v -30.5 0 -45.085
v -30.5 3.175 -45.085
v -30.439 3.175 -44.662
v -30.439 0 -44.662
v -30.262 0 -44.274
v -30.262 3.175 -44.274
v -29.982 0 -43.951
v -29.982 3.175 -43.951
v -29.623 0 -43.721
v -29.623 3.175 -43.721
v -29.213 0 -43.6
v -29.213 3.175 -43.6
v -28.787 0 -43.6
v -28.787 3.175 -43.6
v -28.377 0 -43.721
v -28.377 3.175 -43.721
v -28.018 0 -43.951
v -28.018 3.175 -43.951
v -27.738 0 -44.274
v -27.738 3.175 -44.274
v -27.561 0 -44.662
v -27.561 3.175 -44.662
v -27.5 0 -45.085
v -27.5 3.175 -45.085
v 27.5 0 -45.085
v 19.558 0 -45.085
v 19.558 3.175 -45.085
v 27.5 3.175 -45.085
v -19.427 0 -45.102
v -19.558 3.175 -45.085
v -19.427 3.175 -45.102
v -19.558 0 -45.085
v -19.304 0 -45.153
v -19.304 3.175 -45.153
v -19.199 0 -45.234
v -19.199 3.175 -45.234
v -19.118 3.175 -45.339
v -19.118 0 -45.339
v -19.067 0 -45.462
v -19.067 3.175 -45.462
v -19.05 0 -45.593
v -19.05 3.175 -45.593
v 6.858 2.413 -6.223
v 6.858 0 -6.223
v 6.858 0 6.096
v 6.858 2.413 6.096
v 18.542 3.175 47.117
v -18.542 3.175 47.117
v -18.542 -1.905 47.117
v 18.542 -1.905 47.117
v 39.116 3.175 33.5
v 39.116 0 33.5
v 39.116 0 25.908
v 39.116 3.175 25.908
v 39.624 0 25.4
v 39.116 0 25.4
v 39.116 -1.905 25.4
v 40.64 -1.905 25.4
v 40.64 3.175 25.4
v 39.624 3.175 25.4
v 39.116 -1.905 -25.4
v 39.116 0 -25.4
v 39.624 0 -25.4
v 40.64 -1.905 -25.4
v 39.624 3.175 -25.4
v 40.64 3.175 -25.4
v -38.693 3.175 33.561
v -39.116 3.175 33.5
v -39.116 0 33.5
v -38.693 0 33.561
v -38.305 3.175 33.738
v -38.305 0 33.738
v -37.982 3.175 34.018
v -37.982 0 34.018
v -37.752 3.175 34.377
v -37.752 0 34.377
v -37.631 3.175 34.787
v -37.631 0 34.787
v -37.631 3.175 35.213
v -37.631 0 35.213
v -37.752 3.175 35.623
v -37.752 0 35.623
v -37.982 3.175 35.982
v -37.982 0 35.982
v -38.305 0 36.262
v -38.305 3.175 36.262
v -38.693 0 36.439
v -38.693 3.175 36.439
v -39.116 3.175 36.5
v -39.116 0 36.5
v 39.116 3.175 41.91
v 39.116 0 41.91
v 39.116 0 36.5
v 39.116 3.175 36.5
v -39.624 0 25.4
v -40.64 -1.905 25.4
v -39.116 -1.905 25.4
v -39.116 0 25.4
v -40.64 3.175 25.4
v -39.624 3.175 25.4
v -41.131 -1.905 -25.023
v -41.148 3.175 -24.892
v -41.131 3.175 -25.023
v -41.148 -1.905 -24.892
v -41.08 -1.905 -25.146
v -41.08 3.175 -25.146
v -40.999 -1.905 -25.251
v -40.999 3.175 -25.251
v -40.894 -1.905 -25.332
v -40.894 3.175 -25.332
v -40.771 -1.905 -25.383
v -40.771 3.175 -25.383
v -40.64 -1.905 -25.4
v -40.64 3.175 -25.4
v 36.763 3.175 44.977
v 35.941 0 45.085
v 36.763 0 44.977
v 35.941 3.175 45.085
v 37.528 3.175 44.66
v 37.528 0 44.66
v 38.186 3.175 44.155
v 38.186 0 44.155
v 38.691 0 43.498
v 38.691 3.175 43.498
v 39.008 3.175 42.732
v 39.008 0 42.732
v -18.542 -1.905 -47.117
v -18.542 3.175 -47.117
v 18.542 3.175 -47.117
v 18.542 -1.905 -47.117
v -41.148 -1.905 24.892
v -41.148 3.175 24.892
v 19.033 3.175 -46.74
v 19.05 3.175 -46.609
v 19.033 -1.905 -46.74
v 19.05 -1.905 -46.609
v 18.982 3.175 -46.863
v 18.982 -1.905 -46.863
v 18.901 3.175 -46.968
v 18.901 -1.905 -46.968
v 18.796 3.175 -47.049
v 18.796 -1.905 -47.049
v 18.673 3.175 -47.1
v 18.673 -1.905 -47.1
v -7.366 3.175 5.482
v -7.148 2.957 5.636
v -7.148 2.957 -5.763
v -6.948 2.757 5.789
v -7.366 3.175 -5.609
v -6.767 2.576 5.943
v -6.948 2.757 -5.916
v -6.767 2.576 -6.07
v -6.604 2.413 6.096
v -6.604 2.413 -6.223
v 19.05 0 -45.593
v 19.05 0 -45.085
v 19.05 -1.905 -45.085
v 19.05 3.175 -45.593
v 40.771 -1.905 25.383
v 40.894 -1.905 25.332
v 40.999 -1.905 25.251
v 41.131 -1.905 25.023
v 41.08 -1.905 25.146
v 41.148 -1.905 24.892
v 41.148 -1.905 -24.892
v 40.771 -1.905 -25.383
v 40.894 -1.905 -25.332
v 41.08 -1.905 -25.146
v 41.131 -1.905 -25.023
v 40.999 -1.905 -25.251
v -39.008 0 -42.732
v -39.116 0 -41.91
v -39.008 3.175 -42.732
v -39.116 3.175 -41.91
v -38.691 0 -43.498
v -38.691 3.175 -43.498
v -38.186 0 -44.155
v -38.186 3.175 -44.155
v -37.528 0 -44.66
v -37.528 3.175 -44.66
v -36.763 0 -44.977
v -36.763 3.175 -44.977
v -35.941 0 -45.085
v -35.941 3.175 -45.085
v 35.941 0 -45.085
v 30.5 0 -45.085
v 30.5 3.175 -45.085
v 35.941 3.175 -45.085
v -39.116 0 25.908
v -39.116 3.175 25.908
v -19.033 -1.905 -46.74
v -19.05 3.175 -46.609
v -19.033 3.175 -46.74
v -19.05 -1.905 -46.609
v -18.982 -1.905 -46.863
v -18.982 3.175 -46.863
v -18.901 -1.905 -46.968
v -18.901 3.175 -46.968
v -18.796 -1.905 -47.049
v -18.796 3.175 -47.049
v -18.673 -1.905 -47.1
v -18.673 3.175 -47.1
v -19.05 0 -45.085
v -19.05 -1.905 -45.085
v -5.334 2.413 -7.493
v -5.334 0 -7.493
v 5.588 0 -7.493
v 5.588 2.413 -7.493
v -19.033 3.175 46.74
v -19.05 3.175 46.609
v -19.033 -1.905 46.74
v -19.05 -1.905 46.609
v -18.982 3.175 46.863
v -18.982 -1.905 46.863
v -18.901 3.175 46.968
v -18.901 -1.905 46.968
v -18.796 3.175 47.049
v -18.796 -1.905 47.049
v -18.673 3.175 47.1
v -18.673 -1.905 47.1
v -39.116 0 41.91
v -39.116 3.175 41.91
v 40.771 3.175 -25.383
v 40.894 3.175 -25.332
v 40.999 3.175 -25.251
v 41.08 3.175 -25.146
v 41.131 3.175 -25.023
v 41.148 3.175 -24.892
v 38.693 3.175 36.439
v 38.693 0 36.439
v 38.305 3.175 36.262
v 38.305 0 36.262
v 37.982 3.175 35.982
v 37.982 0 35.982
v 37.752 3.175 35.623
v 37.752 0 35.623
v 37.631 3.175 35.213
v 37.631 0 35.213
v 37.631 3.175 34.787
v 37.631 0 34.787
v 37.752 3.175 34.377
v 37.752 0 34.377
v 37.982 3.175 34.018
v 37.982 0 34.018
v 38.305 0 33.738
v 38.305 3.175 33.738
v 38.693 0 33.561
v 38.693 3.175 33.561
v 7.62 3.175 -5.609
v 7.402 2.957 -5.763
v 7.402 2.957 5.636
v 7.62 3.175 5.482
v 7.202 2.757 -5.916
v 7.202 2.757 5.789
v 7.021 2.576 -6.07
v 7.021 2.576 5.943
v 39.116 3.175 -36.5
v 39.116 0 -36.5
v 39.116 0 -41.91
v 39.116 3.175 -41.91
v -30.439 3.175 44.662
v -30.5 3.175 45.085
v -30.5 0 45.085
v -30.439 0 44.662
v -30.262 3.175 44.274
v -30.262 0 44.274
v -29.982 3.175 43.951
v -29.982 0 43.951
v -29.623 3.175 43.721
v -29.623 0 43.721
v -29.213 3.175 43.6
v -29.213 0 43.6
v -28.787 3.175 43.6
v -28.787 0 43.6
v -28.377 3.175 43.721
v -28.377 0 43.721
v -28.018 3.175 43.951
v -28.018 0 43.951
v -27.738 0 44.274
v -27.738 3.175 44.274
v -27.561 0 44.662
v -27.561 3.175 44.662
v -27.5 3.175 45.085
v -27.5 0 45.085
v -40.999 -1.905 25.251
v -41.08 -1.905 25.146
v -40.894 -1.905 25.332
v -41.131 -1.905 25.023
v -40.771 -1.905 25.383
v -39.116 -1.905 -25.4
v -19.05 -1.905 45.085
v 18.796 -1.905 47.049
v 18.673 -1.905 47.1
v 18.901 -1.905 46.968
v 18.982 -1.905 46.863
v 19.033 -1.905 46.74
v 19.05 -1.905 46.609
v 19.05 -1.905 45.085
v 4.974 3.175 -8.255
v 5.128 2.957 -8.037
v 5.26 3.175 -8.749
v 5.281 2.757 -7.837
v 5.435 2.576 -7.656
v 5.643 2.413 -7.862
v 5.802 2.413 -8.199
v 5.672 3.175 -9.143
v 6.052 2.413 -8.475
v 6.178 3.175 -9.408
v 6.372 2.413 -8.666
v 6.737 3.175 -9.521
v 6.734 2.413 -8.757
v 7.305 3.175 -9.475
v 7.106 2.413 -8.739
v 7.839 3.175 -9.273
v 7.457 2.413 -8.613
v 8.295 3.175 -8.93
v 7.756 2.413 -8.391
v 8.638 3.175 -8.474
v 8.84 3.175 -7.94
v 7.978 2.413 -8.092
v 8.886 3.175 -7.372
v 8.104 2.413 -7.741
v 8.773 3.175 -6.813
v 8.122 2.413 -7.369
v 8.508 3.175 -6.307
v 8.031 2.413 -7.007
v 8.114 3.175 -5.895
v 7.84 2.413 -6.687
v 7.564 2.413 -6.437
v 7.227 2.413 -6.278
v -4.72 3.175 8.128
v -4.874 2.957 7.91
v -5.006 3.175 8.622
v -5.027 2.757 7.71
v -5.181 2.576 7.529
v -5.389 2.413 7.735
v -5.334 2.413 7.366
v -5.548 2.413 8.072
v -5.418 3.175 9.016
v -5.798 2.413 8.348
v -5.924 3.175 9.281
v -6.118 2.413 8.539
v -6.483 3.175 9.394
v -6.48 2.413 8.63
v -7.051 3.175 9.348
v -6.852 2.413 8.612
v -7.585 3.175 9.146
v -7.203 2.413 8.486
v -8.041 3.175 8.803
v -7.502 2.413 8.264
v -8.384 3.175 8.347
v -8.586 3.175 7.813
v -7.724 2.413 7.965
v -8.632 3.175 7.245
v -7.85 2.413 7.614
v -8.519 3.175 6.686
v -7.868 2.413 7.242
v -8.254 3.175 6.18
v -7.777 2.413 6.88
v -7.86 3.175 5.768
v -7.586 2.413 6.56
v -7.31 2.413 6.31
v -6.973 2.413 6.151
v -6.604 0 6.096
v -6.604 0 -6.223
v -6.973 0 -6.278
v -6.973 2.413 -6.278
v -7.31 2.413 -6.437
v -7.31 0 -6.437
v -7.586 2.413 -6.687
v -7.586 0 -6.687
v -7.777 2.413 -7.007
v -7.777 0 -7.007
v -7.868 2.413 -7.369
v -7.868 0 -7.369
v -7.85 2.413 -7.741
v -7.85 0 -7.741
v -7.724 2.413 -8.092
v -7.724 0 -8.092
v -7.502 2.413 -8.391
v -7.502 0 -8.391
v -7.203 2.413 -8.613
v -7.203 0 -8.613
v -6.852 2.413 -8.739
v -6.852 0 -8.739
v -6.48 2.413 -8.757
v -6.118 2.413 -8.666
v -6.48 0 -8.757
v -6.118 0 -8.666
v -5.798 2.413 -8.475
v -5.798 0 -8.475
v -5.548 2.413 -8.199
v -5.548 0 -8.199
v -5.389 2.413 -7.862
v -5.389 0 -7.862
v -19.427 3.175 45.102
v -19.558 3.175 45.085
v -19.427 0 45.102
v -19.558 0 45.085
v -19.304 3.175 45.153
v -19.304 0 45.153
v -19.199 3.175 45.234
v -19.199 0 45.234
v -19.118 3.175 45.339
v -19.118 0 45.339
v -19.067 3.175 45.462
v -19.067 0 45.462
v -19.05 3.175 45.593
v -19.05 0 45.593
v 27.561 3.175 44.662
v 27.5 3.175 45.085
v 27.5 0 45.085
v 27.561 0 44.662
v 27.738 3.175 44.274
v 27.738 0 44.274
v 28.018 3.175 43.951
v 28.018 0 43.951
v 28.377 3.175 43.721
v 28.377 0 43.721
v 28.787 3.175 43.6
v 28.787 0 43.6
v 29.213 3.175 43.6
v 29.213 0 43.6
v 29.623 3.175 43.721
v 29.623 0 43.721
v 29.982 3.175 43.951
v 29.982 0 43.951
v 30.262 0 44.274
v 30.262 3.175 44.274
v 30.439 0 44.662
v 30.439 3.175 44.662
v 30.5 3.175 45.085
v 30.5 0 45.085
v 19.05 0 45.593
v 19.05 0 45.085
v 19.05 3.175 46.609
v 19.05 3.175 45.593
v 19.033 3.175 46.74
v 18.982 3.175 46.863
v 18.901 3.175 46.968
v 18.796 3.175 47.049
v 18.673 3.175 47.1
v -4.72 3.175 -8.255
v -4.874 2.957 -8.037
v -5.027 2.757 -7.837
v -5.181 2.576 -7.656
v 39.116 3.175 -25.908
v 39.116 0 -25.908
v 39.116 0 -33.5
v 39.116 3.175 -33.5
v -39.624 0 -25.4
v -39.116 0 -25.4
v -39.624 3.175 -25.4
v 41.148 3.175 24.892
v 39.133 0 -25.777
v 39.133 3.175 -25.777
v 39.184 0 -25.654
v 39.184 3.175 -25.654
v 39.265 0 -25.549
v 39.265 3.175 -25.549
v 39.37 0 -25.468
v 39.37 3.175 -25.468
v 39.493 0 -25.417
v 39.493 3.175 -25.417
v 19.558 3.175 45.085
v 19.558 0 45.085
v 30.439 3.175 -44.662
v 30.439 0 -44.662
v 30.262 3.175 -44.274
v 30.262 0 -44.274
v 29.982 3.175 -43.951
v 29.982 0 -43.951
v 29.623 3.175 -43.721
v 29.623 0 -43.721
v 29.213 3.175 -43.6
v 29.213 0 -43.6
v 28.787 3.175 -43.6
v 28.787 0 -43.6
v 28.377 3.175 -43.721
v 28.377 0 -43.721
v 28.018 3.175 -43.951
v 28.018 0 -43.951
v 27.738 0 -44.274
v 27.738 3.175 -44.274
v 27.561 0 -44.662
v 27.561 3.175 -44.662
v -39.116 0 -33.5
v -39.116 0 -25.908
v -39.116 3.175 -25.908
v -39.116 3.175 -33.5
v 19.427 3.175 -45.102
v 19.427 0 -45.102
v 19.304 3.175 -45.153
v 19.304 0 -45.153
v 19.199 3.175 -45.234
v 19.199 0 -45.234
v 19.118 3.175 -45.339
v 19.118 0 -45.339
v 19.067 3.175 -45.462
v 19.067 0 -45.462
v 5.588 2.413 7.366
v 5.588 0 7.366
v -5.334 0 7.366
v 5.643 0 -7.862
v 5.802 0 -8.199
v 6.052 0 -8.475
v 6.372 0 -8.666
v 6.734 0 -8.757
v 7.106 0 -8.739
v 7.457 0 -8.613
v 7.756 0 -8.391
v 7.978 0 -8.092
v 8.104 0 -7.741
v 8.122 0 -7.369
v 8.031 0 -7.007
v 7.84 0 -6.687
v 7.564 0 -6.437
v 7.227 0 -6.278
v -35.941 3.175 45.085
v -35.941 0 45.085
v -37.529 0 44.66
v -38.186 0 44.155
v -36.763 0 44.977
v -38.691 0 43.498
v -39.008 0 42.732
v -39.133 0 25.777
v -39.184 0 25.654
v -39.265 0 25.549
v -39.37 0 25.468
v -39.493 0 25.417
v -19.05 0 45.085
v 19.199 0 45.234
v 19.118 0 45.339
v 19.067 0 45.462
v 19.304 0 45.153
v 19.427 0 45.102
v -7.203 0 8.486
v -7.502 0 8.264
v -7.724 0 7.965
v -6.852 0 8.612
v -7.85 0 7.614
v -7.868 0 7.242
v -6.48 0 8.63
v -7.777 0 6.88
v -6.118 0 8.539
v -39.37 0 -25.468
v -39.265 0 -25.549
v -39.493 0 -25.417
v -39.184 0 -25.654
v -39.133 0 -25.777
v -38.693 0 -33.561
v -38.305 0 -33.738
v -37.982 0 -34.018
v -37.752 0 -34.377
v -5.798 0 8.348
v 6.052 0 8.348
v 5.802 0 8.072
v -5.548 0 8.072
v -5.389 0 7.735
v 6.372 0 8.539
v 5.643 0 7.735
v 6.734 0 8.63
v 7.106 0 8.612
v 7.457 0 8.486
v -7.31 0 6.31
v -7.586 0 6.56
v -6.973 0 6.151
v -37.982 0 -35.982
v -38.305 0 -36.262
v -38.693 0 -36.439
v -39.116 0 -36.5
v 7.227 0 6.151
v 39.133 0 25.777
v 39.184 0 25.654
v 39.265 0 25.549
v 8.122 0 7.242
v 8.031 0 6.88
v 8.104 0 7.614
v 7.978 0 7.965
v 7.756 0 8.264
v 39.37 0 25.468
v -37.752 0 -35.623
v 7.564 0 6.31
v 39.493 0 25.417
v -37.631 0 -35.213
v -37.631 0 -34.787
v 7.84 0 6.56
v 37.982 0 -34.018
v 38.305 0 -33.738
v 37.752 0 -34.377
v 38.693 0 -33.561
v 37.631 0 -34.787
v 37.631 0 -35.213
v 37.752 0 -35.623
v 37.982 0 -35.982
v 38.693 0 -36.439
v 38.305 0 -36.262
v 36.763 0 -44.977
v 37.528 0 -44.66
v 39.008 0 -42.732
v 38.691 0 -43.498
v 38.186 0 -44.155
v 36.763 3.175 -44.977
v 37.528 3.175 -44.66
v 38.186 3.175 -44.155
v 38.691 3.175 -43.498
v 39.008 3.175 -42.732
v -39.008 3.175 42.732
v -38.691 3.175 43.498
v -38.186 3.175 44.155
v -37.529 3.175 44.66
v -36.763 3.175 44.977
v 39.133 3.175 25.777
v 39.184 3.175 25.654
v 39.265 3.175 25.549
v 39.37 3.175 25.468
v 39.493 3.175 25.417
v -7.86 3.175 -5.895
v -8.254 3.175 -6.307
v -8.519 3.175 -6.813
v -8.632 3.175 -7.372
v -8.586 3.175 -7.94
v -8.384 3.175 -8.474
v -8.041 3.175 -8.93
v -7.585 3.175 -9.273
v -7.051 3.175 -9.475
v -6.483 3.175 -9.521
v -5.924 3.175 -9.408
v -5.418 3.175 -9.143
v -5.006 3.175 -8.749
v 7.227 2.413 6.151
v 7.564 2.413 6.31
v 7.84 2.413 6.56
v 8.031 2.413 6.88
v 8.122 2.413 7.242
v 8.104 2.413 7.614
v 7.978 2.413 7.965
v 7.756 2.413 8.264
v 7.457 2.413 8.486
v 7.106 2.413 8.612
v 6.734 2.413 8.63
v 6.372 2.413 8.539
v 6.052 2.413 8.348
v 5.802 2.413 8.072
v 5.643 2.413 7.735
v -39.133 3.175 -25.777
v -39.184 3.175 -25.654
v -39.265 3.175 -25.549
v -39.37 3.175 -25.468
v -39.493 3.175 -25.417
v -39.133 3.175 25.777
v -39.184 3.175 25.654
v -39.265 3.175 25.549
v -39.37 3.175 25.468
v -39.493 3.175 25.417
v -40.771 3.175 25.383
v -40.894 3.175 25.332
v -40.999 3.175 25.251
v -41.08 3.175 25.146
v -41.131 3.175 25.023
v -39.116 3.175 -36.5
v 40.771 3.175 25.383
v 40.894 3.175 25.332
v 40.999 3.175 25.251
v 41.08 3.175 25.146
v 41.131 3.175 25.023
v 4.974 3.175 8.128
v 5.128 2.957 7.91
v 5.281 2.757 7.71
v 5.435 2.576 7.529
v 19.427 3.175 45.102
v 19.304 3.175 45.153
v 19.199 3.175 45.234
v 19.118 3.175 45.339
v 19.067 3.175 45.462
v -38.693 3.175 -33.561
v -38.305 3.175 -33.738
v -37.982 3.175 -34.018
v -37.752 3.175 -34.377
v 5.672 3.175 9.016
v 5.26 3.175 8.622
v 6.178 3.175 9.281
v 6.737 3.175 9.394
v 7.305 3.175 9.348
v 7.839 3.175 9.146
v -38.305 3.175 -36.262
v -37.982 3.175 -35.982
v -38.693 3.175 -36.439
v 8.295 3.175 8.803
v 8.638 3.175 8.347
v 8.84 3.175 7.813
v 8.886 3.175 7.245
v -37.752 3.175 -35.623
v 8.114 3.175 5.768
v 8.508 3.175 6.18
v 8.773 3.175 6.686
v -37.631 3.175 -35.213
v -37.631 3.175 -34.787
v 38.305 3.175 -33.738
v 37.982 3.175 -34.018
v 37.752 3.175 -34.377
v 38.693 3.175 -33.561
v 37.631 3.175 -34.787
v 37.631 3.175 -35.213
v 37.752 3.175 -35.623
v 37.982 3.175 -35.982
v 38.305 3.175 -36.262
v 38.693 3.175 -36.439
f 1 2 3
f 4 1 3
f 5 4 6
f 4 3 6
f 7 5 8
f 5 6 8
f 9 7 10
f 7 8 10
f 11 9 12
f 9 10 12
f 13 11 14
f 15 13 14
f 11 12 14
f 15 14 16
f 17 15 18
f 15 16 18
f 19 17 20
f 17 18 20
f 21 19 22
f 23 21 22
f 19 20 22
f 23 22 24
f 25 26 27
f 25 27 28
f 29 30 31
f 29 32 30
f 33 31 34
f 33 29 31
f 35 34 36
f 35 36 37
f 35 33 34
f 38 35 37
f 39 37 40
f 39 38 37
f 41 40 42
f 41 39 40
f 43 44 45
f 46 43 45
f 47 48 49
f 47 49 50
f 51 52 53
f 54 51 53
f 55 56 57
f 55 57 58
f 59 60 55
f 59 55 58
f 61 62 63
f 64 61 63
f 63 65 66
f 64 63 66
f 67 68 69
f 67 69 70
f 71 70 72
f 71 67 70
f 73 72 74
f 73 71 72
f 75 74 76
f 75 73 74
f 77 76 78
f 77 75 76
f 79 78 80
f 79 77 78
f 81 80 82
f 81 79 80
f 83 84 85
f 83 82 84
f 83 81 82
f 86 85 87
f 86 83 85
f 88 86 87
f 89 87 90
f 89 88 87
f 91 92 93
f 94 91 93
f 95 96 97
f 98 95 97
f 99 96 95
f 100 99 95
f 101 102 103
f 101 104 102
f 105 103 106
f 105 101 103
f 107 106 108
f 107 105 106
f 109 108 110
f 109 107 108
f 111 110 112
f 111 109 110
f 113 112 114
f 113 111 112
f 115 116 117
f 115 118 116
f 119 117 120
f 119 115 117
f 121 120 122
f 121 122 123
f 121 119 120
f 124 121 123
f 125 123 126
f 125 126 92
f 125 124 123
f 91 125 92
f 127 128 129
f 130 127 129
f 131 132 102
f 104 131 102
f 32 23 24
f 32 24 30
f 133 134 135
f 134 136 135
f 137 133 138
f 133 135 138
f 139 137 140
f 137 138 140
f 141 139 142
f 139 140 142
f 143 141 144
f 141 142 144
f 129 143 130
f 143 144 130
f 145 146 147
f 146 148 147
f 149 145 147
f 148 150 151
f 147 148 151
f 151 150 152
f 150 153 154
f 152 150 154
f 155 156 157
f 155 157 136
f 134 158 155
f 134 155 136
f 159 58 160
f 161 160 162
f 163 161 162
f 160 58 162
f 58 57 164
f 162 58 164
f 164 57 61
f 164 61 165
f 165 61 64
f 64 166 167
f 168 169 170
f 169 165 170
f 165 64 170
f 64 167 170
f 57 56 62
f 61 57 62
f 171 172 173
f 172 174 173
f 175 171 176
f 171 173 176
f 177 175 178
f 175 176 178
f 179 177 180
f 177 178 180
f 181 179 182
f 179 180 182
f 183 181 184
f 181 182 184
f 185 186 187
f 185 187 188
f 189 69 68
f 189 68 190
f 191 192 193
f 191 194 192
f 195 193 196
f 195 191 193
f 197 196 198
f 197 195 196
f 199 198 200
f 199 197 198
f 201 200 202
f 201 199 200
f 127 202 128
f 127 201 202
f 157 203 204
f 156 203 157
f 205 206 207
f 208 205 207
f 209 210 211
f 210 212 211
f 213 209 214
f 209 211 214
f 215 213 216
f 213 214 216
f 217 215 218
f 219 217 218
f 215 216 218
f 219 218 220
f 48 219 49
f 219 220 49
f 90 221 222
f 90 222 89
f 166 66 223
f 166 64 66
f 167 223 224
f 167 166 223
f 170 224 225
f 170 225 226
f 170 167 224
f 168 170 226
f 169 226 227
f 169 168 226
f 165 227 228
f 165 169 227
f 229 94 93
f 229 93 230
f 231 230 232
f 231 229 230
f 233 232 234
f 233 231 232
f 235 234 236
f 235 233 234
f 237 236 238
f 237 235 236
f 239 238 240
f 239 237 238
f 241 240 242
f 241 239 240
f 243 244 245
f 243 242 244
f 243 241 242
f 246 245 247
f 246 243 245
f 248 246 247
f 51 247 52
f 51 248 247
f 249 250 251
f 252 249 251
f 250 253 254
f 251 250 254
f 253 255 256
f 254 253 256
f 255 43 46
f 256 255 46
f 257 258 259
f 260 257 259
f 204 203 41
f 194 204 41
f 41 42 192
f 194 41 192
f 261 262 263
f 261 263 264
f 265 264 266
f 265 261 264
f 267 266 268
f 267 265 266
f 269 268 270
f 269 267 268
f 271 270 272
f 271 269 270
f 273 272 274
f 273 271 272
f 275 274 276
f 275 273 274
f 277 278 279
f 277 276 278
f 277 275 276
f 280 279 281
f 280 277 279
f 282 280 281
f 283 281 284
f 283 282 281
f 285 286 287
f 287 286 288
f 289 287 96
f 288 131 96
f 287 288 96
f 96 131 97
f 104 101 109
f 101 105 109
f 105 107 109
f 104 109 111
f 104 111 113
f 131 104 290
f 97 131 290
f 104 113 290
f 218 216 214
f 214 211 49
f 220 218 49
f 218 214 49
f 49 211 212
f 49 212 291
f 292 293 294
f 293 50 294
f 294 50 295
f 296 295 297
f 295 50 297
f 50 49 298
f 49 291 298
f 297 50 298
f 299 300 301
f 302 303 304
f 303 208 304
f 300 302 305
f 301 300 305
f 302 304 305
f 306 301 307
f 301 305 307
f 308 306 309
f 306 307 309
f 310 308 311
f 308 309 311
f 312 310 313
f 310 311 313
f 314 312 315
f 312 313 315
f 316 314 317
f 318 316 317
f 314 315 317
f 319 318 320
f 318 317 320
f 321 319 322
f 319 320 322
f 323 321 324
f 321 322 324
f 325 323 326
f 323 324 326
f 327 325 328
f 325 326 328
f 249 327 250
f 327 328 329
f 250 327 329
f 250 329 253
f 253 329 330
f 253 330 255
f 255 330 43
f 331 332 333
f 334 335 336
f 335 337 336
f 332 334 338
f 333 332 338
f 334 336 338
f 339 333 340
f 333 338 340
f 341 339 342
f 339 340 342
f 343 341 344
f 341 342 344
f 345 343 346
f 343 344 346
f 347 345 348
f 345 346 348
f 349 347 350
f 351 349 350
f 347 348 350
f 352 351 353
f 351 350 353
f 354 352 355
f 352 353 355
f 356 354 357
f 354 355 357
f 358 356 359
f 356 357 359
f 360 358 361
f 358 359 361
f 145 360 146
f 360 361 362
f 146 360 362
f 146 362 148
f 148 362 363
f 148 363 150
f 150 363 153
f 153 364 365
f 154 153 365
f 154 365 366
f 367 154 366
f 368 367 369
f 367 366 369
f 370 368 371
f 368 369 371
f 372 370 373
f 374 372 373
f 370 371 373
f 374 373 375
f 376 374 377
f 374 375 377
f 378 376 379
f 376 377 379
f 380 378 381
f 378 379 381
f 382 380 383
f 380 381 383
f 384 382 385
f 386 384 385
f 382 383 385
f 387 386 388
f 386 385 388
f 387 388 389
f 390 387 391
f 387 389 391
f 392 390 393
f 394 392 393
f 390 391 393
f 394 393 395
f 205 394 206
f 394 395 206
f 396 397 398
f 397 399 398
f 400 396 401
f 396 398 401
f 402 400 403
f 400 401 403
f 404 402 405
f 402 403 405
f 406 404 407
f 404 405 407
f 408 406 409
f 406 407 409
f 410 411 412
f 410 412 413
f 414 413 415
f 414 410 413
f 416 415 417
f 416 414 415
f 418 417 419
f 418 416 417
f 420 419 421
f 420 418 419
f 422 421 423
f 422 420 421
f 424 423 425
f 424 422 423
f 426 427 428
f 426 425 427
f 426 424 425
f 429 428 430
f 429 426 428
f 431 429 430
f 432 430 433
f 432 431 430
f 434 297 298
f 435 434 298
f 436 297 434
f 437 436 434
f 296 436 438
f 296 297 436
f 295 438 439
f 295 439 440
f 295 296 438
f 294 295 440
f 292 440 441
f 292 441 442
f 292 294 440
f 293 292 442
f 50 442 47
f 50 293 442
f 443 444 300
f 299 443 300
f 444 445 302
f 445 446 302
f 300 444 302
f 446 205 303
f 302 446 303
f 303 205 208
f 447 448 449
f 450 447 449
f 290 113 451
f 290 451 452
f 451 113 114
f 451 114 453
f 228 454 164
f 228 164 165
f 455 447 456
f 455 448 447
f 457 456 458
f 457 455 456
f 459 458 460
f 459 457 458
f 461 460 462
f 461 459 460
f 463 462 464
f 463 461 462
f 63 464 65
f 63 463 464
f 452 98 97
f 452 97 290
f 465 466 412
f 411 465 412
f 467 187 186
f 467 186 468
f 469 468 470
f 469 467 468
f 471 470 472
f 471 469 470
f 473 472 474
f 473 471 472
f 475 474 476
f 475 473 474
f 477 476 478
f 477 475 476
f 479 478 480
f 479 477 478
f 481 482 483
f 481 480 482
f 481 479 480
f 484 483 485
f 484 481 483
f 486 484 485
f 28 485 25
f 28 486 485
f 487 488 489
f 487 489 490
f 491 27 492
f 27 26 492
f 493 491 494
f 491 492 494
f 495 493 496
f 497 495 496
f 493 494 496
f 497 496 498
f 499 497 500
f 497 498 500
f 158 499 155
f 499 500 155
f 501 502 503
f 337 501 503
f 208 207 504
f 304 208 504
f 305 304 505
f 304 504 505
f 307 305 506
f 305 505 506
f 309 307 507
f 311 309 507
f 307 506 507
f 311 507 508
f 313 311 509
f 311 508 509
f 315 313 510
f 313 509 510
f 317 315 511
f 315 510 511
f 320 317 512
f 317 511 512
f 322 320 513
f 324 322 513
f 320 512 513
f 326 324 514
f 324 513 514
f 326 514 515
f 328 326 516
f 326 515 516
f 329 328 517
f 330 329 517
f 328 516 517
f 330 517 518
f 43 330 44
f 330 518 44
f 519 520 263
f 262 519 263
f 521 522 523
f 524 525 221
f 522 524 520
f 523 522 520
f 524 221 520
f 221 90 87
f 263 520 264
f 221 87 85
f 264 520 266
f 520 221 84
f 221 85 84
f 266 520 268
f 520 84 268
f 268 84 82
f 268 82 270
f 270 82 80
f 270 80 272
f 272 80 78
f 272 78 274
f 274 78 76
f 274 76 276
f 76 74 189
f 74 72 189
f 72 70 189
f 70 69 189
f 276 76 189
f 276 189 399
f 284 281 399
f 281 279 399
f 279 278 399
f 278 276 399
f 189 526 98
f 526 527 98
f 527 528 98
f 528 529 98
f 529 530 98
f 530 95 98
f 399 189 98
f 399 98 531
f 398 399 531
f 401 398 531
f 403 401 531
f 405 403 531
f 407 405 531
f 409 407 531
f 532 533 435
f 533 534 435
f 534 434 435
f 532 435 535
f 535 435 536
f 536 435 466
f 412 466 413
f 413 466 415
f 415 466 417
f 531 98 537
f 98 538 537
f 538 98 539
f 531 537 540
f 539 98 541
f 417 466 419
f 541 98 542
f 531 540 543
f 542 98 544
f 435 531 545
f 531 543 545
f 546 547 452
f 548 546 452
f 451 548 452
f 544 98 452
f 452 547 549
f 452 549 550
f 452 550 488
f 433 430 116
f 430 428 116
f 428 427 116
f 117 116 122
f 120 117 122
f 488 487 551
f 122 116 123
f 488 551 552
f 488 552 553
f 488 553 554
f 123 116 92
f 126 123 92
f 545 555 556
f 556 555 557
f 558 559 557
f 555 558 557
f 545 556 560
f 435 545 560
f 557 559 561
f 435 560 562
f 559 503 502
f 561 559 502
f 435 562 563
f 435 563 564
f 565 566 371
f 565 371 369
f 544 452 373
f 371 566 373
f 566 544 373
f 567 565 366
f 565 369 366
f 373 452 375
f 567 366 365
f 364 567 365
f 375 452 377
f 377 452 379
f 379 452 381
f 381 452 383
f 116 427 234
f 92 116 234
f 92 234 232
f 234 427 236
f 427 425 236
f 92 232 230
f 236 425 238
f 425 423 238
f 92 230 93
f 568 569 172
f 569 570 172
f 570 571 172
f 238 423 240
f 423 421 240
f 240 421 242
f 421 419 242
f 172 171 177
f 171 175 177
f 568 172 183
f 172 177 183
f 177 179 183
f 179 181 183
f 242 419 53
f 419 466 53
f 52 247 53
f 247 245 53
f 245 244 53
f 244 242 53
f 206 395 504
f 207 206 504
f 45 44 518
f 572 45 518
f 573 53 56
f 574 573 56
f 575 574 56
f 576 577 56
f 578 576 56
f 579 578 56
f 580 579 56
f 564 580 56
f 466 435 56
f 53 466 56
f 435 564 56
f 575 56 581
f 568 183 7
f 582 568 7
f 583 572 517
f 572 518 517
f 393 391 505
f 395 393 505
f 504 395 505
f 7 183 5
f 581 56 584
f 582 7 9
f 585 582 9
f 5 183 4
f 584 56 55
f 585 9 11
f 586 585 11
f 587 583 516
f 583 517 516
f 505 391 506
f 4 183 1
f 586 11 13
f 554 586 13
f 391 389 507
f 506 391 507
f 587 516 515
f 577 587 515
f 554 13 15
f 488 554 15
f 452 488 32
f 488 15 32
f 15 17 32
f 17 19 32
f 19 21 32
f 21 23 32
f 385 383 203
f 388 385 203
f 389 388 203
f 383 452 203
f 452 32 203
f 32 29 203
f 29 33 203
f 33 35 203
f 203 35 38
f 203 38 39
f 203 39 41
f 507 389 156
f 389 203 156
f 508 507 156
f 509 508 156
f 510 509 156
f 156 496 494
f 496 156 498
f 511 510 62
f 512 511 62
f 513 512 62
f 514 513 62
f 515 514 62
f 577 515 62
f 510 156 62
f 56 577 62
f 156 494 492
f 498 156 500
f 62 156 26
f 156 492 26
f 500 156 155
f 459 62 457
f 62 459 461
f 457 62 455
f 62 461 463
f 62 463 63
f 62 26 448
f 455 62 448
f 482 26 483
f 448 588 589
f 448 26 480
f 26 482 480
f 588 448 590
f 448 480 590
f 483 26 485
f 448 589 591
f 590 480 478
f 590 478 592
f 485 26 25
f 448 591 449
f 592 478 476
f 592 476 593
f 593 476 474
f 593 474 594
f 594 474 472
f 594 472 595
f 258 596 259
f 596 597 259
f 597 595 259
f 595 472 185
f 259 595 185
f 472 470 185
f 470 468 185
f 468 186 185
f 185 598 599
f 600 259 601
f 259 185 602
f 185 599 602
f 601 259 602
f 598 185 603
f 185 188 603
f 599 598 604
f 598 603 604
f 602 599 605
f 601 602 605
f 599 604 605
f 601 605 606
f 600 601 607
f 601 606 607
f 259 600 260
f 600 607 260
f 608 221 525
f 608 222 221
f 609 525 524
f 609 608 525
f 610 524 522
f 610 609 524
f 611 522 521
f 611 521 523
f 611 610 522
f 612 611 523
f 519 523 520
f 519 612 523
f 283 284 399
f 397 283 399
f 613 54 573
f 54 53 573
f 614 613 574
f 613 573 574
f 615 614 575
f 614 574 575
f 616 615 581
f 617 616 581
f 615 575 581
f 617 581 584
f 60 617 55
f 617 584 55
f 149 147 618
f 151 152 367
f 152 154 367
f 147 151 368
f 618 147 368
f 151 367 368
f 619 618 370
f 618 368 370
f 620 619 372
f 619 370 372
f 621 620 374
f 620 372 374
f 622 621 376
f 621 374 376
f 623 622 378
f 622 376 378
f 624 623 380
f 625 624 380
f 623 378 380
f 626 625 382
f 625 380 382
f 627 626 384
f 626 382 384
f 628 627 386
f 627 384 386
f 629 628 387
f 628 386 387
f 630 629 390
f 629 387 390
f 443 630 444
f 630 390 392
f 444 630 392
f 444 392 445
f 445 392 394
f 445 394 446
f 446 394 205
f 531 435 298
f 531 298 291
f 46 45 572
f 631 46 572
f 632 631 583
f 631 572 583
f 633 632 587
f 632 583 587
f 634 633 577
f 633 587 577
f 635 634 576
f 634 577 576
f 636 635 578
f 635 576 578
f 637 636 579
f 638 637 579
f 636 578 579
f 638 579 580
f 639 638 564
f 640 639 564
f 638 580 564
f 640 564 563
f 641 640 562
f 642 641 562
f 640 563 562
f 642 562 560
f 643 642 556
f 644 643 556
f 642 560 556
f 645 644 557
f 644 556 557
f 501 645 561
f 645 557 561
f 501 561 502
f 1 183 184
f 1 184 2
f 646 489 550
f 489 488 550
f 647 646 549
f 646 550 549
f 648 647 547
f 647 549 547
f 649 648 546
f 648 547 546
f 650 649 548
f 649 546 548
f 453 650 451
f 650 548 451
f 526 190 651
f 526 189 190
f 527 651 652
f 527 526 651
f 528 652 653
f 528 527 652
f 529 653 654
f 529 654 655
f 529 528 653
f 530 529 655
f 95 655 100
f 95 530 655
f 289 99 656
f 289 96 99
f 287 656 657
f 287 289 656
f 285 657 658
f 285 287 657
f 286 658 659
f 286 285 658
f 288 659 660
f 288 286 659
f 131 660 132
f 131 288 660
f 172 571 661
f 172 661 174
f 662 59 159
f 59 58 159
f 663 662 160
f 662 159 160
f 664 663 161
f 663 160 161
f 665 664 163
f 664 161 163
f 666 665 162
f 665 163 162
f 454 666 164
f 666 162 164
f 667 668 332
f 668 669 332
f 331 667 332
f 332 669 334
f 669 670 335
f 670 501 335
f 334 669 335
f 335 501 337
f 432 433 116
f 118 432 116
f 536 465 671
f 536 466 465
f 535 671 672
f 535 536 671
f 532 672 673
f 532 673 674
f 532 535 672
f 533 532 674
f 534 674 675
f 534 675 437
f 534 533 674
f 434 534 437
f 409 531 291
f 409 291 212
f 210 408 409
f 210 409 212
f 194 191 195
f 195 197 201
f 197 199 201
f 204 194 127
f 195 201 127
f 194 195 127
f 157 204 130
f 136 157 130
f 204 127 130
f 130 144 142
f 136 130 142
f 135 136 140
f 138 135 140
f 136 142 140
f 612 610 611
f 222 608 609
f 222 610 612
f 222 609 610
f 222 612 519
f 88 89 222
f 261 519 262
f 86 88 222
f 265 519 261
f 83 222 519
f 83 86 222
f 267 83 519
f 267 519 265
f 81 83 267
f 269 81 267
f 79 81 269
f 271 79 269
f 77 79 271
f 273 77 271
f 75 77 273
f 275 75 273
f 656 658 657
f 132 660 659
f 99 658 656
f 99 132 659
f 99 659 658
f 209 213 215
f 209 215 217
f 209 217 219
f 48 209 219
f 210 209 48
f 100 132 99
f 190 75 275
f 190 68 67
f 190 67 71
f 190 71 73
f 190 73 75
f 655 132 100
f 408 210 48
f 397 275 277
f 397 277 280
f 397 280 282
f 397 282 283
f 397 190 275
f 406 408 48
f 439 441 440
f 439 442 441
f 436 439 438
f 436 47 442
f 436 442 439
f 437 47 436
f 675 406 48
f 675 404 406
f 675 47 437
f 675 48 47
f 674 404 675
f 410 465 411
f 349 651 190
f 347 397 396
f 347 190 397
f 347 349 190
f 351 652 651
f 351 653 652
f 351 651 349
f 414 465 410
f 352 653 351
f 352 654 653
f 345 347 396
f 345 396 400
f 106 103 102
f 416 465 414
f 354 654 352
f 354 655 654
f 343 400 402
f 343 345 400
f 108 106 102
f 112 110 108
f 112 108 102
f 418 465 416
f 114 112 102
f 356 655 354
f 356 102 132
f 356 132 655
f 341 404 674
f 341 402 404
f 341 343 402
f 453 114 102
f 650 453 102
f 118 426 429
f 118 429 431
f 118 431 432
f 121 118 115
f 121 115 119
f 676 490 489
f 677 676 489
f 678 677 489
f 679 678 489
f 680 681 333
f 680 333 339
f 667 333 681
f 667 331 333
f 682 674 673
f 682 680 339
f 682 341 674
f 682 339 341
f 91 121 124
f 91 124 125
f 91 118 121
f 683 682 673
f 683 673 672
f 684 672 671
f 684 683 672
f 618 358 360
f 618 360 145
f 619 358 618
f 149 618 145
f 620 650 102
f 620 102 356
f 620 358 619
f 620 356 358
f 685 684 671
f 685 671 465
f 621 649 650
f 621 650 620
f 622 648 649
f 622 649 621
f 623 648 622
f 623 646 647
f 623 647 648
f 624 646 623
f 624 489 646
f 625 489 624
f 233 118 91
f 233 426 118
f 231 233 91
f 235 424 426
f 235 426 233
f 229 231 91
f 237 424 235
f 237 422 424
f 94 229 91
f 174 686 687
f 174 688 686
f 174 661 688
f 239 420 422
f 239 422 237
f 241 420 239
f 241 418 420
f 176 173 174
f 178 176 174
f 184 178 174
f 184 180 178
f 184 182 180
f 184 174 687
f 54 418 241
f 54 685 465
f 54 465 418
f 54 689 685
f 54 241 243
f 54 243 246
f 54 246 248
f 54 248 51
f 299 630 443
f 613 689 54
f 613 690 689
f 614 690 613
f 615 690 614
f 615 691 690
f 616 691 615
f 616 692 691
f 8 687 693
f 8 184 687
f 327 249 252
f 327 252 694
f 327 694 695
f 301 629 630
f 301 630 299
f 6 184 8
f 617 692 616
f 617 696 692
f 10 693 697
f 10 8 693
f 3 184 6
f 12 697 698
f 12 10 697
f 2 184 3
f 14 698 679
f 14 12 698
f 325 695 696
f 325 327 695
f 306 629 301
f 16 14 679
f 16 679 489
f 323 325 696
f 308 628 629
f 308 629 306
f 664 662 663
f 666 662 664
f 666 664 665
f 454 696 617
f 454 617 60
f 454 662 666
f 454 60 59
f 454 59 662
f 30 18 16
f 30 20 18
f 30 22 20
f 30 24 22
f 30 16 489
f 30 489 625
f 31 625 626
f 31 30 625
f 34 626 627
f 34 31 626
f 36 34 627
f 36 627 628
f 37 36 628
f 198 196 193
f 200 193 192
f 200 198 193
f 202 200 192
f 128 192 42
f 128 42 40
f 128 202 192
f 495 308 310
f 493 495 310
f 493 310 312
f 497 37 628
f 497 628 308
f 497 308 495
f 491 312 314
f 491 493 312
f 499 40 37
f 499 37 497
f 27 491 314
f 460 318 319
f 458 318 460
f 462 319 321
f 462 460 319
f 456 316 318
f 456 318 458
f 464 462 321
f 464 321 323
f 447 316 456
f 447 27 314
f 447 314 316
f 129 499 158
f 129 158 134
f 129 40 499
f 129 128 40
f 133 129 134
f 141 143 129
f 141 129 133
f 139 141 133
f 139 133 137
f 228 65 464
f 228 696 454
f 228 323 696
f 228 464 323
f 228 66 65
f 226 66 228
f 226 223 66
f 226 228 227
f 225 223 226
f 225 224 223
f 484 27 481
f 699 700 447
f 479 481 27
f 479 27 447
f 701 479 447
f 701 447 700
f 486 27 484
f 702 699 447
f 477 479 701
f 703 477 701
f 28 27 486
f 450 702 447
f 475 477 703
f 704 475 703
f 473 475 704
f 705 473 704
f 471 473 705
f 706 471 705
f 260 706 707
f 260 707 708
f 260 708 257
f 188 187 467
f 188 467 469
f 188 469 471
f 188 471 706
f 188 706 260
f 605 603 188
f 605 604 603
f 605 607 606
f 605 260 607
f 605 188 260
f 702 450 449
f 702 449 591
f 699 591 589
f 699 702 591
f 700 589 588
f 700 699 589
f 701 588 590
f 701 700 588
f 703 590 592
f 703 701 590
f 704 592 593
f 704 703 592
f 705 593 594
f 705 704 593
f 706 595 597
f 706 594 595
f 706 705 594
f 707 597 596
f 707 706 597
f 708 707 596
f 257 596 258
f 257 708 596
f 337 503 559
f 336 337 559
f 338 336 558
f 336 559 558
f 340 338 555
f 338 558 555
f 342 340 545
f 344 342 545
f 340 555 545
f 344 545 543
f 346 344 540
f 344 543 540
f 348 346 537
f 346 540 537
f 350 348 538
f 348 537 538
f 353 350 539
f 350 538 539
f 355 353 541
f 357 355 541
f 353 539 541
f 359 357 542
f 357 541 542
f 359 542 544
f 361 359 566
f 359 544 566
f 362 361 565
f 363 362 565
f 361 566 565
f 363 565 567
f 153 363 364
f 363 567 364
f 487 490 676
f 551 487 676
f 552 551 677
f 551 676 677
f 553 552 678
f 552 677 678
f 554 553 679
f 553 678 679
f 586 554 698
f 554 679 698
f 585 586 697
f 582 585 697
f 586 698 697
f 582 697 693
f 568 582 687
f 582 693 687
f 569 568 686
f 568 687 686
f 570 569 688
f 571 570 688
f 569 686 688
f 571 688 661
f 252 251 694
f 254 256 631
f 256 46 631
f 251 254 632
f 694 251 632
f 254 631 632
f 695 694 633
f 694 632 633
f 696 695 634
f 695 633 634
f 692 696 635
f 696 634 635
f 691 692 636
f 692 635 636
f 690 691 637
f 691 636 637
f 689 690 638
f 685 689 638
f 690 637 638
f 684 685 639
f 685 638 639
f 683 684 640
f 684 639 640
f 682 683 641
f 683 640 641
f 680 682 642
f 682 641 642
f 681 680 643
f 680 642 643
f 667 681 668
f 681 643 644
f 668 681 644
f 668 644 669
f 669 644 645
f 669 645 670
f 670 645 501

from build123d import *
from OCP.BRepAlgoAPI import BRepAlgoAPI_Cut
from OCP.TopTools import TopTools_ListOfShape

# Parameters (mm, degrees)
SKETCH1_W           = 78.232
SKETCH1_H           = 90.17
BOSS_EXTRUDE1_DEPTH = 3.175
FILLET1_R           = 3.175
SKETCH2_W           = 2.032
SKETCH2_H           = 50.8
SKETCH2_W_2         = 38.1
SKETCH2_H_2         = 2.032
BOSS_EXTRUDE2_DEPTH = 5.08
FILLET3_R           = 0.508
CUT_EXTRUDE1_DEPTH  = 63.761267046
CHAMFER2_SIZE       = 0.762


with BuildPart() as part:
    # Sketch1 → Boss-Extrude1 (new body)
    with BuildSketch(Plane(origin=(0, 0, 0), x_dir=(1, 0, 0), z_dir=(0, 1, 0))):
        Rectangle(SKETCH1_W, SKETCH1_H)
        with BuildLine():
            Line((-5.334, 7.493), (5.588, 7.493))
            ThreePointArc((5.588, 7.493), (7.756025612, 8.391025612), (6.858, 6.223))
            Line((6.858, 6.223), (6.858, -6.096))
            ThreePointArc((6.858, -6.096), (7.756025612, -8.264025612), (5.588, -7.366))
            Line((5.588, -7.366), (-5.334, -7.366))
            ThreePointArc((-5.334, -7.366), (-7.502025612, -8.264025612), (-6.604, -6.096))
            Line((-6.604, -6.096), (-6.604, 6.223))
            ThreePointArc((-6.604, 6.223), (-7.502025612, 8.391025612), (-5.334, 7.493))
        make_face(mode=Mode.SUBTRACT)
    extrude(amount=BOSS_EXTRUDE1_DEPTH)

    # Fillet1
    fillet1_edges = [part.edges().sort_by_distance(p)[0] for p in [
        (-39.116, 1.5875, -45.085),
        (39.116, 1.5875, -45.085),
        (39.116, 1.5875, 45.085),
        (-39.116, 1.5875, 45.085),
    ]]
    fillet(fillet1_edges, radius=FILLET1_R)


with BuildPart() as boss_extrude2_tool:
    # Sketch2 → Boss-Extrude2 (new body)
    with BuildSketch(Plane(origin=(0, 3.175, 0), x_dir=(1, 0, 0), z_dir=(0, 1, 0))):
        Polygon((19.049995564, -47.117005476), (19.049995755, -45.085005476), (-19.050004245, -45.085001889), (-19.050004436, -47.117001889), align=None)
        with Locations((-40.132001661, 0)):
            Rectangle(SKETCH2_W, SKETCH2_H)
        with Locations((0, 46.101)):
            Rectangle(SKETCH2_W_2, SKETCH2_H_2)
        with Locations((40.132001661, 0)):
            Rectangle(SKETCH2_W, SKETCH2_H)
    extrude(amount=-BOSS_EXTRUDE2_DEPTH)


with BuildPart() as part_1:
    add(part.part)


with BuildPart() as part_2:
    # Boss-Extrude2: joined with boss_extrude2_tool
    add(part_1.part.fuse(boss_extrude2_tool.part, tol=0.00001))

    # Fillet3
    fillet3_edges = [part_2.edges().sort_by_distance(p)[0] for p in [
        (19.05, 1.5875, -45.085),
        (-19.05, 1.5875, -45.085),
        (-19.05, 0.635, -47.117),
        (19.05, 0.635, -47.117),
        (-39.116001661, 1.5875, 25.4),
        (-39.116001661, 1.5875, -25.4),
        (-41.148001661, 0.635, 25.4),
        (-41.148001661, 0.635, -25.4),
        (39.116001661, 1.5875, 25.4),
        (39.116001661, 1.5875, -25.4),
        (41.148001661, 0.635, -25.4),
        (41.148001661, 0.635, 25.4),
        (19.049995755, 1.5875, 45.085005476),
        (-19.050004245, 1.5875, 45.085001889),
        (19.049995564, 0.635, 47.117005476),
        (-19.050004436, 0.635, 47.117001889),
    ]]
    fillet(fillet3_edges, radius=FILLET3_R)


with BuildPart() as cut_extrude1_tool:
    # Sketch3 → Cut-Extrude1 (new, through all)
    with BuildSketch(Plane(origin=(0, 3.175, 0), x_dir=(1, 0, 0), z_dir=(0, 1, 0))):
        with BuildLine():
            Line((-39.116, 36.5), (-39.116, 33.5))
            ThreePointArc((-39.116, 33.5), (-37.616, 35), (-39.116, 36.5))
        make_face()
        with BuildLine():
            Line((-27.5, 45.085), (-30.5, 45.085))
            ThreePointArc((-30.5, 45.085), (-29, 43.585), (-27.5, 45.085))
        make_face()
        with BuildLine():
            Line((27.499999809, 45.084997268), (30.499999809, 45.084997268))
            ThreePointArc((30.499999809, 45.084997268), (28.999999809, 43.584997268), (27.499999809, 45.084997268))
        make_face()
        with BuildLine():
            Line((39.115998859, 36.499996315), (39.115998859, 33.499996315))
            ThreePointArc((39.115998859, 33.499996315), (37.615998859, 34.999996315), (39.115998859, 36.499996315))
        make_face()
        with BuildLine():
            Line((39.115998859, -33.499996315), (39.115998859, -36.499996315))
            ThreePointArc((39.115998859, -36.499996315), (37.615998859, -34.999996315), (39.115998859, -33.499996315))
        make_face()
        with BuildLine():
            Line((30.499999809, -45.084997268), (27.499999809, -45.084997268))
            ThreePointArc((27.499999809, -45.084997268), (28.999999809, -43.584997268), (30.499999809, -45.084997268))
        make_face()
        with BuildLine():
            Line((-27.5, -45.085), (-30.5, -45.085))
            ThreePointArc((-30.5, -45.085), (-29, -43.585), (-27.5, -45.085))
        make_face()
        with BuildLine():
            Line((-39.116, -36.5), (-39.116, -33.5))
            ThreePointArc((-39.116, -33.5), (-37.616, -35), (-39.116, -36.5))
        make_face()
    extrude(amount=-CUT_EXTRUDE1_DEPTH)


with BuildPart() as part_3:
    add(part_2.part)

    # Cut-Extrude1: cut by cut_extrude1_tool, with a tolerance
    cut_extrude1_stock = TopTools_ListOfShape()
    cut_extrude1_stock.Append(part_3.part.wrapped)
    cut_extrude1_tools = TopTools_ListOfShape()
    cut_extrude1_tools.Append(cut_extrude1_tool.part.wrapped)
    cut_extrude1_cut = BRepAlgoAPI_Cut()
    cut_extrude1_cut.SetArguments(cut_extrude1_stock)
    cut_extrude1_cut.SetTools(cut_extrude1_tools)
    cut_extrude1_cut.SetFuzzyValue(0.00001)
    cut_extrude1_cut.Build()
    add(Compound.cast(cut_extrude1_cut.Shape()).solids(), mode=Mode.REPLACE)

    # Chamfer2
    chamfer2_edges = [part_3.edges().sort_by_distance(p)[0] for p in [
        (-7.502025612, 3.175, -8.391025612),
        (-6.604, 3.175, -0.0635),
        (-7.502025612, 3.175, 8.264025612),
        (0.127, 3.175, 7.366),
        (7.756025612, 3.175, 8.264025612),
        (6.858, 3.175, -0.0635),
        (7.756025612, 3.175, -8.391025612),
        (0.127, 3.175, -7.493),
    ]]
    chamfer(chamfer2_edges, length=CHAMFER2_SIZE)


solid = part_3.part
